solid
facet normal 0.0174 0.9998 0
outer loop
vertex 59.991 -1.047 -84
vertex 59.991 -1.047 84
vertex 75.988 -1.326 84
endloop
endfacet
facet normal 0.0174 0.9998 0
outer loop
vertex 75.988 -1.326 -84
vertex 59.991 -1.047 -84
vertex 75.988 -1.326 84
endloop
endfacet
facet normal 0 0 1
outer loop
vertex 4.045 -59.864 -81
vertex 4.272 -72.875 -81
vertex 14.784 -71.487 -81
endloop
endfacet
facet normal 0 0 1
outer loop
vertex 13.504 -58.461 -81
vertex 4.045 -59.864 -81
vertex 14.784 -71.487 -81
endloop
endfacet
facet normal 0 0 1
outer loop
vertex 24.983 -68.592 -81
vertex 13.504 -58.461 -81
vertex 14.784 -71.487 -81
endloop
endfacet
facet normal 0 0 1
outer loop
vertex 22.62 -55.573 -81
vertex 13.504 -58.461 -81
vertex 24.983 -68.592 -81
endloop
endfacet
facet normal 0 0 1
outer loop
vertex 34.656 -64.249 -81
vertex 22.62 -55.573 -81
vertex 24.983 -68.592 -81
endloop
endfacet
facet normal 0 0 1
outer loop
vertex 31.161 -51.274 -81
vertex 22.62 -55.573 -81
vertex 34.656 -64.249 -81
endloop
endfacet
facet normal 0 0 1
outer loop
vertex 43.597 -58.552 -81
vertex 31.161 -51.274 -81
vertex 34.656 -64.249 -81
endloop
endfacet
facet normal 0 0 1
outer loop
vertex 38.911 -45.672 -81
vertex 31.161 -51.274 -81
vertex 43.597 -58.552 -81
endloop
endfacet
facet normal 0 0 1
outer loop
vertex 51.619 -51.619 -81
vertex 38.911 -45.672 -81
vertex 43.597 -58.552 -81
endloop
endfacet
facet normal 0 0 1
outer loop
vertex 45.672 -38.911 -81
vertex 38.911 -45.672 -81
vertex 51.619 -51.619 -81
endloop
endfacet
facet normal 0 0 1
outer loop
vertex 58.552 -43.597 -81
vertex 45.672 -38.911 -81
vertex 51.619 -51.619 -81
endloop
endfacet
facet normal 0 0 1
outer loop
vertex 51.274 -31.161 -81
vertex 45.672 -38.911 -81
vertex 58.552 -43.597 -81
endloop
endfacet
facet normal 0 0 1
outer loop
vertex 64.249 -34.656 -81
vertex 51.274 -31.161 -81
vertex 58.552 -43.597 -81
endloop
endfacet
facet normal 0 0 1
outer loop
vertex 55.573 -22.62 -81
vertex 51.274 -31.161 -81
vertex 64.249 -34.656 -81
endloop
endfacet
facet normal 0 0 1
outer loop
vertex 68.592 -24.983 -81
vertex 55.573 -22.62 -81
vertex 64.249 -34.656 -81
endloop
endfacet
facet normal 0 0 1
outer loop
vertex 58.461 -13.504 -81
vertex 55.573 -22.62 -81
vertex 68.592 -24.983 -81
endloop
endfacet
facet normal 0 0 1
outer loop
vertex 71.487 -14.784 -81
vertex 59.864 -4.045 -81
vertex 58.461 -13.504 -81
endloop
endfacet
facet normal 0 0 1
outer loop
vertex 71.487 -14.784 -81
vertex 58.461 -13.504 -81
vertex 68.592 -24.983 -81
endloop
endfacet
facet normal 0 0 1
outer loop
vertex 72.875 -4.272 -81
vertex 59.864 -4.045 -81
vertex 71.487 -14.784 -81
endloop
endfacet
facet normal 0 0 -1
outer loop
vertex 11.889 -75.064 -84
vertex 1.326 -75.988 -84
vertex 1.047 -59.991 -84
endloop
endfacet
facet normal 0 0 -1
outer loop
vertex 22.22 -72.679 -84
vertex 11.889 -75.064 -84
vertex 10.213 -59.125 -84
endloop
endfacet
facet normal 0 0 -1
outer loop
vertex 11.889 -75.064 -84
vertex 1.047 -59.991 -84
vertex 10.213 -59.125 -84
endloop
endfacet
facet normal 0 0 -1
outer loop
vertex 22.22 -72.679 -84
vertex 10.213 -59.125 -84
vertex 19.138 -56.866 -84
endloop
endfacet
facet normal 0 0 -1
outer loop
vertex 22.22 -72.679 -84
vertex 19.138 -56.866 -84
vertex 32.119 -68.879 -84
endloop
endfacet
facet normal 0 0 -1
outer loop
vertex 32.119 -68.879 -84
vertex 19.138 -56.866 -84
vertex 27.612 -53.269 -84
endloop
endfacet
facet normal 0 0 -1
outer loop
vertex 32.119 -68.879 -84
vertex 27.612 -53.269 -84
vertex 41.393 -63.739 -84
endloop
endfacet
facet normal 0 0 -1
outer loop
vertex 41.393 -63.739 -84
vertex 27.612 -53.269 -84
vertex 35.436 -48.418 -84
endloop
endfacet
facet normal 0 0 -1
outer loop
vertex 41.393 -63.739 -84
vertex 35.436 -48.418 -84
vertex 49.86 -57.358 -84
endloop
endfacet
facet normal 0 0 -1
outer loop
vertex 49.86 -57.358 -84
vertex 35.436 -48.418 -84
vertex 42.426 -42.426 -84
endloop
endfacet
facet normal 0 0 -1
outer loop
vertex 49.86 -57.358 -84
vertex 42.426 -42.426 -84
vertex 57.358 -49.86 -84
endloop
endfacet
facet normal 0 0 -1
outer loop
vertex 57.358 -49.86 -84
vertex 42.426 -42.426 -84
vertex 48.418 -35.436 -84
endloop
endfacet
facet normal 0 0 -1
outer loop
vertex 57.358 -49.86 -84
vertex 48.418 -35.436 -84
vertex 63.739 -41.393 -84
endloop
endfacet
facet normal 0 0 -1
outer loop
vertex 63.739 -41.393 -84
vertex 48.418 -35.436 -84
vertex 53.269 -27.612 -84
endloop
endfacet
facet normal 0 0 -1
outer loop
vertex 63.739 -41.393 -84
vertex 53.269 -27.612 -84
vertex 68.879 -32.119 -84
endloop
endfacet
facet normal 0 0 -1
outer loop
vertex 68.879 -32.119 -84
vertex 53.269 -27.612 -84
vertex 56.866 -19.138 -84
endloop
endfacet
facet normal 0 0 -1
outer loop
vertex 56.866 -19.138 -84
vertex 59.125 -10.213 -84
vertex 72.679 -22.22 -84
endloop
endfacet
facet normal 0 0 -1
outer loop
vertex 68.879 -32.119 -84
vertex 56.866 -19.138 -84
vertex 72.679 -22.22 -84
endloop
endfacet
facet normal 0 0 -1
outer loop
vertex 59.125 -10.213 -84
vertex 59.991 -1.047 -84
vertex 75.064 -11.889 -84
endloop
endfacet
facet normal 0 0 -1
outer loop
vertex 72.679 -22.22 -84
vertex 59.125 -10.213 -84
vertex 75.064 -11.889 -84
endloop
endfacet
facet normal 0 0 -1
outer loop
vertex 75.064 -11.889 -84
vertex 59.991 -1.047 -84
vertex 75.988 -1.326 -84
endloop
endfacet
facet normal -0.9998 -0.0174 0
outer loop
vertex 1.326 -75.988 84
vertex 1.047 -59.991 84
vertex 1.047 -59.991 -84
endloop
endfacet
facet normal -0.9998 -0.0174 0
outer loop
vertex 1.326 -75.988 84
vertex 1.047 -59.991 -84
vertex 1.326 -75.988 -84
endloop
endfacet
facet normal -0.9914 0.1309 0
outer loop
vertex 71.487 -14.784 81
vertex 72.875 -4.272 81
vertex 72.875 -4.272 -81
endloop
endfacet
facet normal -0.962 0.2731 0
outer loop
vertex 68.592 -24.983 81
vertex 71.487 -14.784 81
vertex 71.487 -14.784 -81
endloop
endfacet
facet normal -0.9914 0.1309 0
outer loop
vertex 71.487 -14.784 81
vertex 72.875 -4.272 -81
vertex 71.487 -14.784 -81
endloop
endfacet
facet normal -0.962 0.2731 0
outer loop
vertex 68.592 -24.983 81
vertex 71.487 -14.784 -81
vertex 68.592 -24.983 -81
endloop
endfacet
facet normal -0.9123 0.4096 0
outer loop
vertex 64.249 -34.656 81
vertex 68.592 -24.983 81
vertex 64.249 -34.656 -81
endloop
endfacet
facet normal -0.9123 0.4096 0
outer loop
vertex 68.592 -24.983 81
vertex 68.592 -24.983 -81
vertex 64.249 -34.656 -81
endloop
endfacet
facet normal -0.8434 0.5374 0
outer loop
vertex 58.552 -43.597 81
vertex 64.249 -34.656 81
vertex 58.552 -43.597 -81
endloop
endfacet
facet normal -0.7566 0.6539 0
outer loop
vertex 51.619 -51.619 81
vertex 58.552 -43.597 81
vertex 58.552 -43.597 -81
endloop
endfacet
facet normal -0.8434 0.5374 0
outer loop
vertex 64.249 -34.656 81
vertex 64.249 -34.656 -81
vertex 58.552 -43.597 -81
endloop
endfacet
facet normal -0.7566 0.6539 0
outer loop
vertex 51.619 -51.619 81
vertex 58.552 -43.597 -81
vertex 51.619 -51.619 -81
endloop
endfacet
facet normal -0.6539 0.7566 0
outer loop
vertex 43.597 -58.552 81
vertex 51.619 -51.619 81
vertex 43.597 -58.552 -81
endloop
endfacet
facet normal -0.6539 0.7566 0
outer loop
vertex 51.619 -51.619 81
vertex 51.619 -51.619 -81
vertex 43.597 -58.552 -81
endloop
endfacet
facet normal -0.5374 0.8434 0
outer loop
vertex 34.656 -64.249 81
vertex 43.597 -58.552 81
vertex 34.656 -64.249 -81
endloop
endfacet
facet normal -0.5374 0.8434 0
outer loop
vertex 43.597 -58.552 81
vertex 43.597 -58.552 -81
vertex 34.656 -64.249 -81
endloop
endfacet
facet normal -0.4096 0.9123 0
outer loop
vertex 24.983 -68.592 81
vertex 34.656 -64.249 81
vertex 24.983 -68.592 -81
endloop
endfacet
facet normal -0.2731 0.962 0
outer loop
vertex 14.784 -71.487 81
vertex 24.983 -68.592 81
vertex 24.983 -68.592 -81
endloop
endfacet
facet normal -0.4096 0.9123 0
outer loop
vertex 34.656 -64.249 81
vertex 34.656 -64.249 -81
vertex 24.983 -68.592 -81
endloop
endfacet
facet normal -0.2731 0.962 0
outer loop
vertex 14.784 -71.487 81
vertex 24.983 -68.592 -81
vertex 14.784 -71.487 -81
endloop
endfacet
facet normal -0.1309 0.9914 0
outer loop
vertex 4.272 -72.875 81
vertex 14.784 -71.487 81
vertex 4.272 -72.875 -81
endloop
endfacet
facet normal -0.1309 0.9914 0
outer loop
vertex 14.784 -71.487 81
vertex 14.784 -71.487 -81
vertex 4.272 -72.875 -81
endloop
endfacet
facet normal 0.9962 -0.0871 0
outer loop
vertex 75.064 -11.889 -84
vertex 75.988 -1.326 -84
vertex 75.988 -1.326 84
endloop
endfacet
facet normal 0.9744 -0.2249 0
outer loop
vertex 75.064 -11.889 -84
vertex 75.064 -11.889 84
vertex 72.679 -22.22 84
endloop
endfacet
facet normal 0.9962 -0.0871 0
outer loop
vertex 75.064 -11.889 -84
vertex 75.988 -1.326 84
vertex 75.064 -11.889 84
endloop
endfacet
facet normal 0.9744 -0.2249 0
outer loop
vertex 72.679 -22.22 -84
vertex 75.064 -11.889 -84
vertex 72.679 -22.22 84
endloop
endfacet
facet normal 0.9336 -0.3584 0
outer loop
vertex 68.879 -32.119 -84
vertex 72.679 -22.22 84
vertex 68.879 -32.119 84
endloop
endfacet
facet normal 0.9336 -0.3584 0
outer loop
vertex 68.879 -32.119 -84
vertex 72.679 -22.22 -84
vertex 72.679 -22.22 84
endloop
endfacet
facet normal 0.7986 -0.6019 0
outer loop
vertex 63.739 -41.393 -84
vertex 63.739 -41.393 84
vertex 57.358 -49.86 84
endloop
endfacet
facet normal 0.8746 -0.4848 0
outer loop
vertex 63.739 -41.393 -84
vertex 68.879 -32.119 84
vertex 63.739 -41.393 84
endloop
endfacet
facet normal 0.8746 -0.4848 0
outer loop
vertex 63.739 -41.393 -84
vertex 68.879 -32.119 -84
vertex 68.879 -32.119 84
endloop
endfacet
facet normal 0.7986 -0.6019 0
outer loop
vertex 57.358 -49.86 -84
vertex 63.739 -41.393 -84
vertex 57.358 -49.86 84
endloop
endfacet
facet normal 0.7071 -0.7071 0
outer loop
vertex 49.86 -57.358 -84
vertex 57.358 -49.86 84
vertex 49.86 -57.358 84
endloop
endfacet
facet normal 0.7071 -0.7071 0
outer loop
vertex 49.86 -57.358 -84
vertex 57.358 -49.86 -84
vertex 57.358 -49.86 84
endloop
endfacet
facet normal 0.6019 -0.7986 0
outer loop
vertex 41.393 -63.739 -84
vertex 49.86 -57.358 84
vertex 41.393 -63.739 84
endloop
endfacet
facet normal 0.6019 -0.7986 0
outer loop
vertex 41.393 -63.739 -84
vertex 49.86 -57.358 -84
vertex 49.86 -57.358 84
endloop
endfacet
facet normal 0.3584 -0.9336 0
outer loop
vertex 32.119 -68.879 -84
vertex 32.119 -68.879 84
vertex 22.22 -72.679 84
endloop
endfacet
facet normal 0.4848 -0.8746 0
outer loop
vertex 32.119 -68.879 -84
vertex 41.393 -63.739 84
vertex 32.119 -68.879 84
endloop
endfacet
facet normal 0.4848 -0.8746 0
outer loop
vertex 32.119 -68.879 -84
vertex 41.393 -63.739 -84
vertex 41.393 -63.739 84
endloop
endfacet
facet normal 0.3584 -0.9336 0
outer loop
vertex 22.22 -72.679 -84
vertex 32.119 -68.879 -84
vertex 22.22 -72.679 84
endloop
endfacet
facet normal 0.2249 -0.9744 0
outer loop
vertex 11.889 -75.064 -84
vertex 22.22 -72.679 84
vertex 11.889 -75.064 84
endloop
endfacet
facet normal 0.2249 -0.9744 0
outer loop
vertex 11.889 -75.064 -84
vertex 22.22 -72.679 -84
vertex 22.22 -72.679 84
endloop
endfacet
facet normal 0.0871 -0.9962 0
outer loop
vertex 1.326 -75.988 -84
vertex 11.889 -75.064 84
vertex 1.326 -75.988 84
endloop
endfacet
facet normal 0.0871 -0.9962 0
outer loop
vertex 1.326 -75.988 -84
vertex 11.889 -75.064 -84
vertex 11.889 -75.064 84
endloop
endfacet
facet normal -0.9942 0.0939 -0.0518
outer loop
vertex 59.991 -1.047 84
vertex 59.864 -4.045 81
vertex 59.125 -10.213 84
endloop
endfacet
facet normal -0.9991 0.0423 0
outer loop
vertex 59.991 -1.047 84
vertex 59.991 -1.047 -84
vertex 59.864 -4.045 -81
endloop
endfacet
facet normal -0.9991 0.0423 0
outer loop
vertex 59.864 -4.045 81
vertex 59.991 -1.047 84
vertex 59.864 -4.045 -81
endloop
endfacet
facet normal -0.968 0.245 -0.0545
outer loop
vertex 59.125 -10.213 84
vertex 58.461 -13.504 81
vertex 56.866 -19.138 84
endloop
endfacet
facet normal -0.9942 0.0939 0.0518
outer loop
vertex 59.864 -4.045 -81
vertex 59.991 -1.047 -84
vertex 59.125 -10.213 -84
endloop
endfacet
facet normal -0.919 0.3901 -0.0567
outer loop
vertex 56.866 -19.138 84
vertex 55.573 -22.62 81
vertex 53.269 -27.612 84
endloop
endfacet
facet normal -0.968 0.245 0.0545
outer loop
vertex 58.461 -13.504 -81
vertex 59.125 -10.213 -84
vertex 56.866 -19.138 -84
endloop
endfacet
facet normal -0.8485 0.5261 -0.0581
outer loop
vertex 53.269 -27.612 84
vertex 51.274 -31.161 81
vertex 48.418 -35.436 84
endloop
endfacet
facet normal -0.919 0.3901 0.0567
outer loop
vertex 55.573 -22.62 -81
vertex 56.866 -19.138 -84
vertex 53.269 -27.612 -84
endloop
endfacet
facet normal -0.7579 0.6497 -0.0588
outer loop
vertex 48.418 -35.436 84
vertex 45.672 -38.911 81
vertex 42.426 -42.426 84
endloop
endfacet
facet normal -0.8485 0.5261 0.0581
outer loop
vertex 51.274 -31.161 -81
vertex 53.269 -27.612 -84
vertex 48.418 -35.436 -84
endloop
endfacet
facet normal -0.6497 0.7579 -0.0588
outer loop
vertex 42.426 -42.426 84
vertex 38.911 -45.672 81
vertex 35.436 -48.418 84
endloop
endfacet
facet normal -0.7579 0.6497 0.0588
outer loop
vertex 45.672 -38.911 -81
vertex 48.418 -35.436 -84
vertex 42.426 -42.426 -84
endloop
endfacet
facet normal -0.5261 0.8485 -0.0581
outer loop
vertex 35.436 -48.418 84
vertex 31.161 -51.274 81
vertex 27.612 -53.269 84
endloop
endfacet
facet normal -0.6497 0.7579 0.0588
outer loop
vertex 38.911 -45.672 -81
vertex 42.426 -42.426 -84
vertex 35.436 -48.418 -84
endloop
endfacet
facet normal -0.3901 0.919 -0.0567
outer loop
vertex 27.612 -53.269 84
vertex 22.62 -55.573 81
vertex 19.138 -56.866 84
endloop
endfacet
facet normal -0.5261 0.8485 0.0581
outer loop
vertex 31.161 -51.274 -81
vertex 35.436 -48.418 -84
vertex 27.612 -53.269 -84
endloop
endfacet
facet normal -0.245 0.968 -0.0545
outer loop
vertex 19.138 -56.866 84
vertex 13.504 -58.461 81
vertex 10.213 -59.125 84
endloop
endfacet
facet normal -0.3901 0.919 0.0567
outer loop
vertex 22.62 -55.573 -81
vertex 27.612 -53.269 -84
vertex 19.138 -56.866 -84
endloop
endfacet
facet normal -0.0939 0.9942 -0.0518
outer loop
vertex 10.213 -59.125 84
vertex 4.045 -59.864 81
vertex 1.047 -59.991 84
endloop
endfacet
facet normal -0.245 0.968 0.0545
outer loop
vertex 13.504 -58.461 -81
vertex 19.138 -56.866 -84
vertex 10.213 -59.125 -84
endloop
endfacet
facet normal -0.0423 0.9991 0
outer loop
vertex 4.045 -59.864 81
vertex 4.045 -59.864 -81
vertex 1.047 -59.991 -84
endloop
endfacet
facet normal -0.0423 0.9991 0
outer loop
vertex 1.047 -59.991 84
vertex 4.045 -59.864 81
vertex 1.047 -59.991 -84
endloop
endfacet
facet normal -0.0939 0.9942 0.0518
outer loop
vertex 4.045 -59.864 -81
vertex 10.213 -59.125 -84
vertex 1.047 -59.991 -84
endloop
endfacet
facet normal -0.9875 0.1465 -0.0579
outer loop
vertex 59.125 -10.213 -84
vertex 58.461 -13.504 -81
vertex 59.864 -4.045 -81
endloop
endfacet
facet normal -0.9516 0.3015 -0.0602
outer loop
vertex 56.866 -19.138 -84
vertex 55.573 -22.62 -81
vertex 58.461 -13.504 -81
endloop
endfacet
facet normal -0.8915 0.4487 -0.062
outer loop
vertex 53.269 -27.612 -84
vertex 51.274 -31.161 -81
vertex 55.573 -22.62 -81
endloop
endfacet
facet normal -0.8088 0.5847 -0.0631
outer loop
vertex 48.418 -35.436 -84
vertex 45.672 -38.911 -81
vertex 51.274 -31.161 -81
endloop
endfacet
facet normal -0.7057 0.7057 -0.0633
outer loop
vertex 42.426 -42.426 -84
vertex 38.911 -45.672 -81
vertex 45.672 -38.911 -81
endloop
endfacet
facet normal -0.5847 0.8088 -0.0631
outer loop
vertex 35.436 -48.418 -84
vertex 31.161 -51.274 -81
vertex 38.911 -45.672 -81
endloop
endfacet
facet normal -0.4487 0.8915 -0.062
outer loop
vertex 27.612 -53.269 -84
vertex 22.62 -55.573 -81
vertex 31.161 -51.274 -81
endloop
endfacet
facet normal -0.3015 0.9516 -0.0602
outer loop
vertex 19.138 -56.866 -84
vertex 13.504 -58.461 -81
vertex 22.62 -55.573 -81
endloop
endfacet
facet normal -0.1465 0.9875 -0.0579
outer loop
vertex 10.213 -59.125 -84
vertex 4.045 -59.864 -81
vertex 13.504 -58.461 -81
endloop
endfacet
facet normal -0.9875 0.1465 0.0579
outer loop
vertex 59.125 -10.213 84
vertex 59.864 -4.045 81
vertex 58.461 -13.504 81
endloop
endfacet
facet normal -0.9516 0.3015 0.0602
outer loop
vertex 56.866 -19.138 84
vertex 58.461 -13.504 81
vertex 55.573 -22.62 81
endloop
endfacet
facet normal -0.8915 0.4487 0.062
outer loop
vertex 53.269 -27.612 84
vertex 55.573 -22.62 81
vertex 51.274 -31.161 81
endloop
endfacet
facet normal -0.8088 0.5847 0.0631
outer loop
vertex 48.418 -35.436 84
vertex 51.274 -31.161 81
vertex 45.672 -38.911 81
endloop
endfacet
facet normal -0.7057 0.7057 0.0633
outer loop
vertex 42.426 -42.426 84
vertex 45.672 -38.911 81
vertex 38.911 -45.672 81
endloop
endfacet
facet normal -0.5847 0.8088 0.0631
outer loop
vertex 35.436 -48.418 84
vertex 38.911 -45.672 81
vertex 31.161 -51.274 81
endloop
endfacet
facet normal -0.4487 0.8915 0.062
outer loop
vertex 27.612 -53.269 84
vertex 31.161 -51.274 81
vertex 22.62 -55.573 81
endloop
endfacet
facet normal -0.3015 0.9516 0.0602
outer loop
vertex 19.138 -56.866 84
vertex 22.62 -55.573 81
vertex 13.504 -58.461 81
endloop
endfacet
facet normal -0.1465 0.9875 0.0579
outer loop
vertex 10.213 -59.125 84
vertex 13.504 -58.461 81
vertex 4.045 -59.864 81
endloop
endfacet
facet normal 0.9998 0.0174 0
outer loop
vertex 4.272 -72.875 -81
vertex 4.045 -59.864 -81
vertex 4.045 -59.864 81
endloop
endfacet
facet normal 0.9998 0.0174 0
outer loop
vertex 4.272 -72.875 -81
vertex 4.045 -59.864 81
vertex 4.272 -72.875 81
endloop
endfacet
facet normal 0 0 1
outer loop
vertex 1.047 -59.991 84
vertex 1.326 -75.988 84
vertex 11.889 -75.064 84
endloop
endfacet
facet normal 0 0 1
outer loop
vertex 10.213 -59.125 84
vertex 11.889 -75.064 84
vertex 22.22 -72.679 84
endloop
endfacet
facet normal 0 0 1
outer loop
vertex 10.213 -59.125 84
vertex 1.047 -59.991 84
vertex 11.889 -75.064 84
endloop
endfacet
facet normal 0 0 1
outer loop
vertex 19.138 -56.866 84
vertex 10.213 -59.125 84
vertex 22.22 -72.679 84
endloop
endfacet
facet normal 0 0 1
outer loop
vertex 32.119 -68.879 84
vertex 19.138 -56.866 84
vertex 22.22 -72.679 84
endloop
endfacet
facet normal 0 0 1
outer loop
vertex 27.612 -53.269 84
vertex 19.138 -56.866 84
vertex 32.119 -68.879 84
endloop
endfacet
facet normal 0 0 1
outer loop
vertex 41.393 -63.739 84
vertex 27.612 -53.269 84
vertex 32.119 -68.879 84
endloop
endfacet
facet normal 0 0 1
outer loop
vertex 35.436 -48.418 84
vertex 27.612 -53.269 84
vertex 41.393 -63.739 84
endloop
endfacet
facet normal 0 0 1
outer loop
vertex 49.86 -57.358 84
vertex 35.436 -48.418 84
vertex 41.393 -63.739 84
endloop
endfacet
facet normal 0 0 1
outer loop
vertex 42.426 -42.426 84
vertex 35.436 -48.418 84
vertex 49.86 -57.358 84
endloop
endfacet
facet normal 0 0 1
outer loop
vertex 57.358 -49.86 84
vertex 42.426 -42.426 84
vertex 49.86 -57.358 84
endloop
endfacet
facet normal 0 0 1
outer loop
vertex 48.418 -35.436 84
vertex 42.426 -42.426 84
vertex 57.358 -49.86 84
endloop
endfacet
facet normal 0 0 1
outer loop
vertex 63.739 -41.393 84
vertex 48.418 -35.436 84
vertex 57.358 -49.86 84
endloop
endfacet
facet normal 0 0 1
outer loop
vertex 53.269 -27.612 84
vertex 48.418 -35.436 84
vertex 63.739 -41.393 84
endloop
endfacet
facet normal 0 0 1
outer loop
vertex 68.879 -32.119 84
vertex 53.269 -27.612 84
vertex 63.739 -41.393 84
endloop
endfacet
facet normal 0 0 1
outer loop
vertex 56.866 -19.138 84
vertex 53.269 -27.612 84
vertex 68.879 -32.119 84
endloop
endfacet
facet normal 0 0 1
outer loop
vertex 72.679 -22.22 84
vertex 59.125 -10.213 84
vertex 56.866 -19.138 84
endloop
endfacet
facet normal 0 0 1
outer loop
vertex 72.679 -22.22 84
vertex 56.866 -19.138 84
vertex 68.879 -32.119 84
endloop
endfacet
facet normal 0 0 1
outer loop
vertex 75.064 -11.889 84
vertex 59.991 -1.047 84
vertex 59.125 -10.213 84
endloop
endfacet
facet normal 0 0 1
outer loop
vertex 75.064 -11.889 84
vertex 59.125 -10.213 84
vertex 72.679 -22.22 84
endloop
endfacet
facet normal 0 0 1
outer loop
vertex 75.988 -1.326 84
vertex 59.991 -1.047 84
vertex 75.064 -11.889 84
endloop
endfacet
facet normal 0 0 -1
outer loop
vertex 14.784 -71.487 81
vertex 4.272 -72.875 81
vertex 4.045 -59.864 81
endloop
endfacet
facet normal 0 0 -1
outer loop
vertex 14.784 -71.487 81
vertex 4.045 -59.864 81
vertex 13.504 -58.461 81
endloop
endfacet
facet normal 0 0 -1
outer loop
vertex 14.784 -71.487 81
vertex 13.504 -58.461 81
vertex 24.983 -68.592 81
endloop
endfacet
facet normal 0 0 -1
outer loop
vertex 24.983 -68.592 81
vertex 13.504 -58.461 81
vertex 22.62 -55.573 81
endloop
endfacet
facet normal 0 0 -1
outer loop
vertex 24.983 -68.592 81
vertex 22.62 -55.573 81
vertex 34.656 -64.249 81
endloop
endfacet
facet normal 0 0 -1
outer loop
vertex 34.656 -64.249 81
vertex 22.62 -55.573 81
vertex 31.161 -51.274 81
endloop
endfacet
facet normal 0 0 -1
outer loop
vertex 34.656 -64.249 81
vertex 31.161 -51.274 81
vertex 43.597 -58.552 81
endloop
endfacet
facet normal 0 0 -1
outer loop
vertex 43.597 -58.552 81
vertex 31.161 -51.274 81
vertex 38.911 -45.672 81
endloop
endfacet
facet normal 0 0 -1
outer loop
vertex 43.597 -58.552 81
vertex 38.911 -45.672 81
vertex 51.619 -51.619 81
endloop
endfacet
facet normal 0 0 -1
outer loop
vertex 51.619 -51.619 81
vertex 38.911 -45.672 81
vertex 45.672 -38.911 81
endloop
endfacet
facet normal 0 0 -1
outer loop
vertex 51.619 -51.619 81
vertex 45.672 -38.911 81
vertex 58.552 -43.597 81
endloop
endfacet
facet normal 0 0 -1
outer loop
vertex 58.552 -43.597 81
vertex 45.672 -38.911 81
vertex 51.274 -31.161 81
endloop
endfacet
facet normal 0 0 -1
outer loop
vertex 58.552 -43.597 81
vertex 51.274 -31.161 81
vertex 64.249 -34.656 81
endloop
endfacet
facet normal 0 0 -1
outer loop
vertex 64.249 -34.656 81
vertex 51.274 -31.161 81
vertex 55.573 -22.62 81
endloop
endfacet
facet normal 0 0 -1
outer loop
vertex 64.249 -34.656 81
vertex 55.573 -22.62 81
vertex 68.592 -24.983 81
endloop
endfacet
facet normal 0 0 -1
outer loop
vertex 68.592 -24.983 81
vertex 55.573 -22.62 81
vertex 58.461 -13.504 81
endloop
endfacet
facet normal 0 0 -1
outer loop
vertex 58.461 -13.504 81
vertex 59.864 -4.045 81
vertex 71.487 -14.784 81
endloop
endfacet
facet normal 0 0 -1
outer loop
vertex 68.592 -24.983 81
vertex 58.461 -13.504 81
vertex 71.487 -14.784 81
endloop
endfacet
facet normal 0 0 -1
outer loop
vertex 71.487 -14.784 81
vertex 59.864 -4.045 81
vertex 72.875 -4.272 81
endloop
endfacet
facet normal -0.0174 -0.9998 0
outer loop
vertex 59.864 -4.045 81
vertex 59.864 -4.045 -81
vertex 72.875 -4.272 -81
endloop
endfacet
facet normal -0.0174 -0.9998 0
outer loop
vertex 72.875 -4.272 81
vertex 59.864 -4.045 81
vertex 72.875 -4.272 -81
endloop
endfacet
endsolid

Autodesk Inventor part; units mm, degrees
ref_plane "Work Plane1" through (0, 0, 87) normal (0, 0, 1) x (1, 0, 0)
ref_plane "YZ Plane" through (0, 0, 0) normal (1, 0, 0) x (0, 1, 0)
ref_plane "XZ Plane" through (0, 0, 0) normal (0, 1, 0) x (-1, 0, 0)
sketch "Sketch4" plane through (0, 0, 0) normal (0, 0, 1) x (1, 0, 0)
  arc A0 (1.3264, -75.9884) -> (75.9884, -1.3264) centre (0, 0) ccw
  arc A1 (1.0471, -59.9909) -> (59.9909, -1.0471) centre (0, 0) ccw
  line L0 (0, -92.1462) -> (0, 0) construction
  line L1 (0, 0) -> (129.1278, 0) construction
  line L2 (0, 0) -> (106.82, -1.8646) construction
  line L3 (0, 0) -> (1.3871, -79.4693) construction
  line L4 (1.0471, -59.9909) -> (1.3264, -75.9884)
  line L5 (59.9909, -1.0471) -> (75.9884, -1.3264)
  dimension "d33" = 152
  dimension "d34" = 120
  dimension "d35" = 1
  dimension "d36" = 1
extrude "Extrusion3" add sketch "Sketch4" along normal mid plane 168
shell "Shell2" thickness 3 removed faces 1 at (4.4562, -59.8343, 28)
sketch "Sketch1" plane through (0, 0, 0) normal (0, 0, 1) x (1, 0, 0)
  circle A0 centre (0, 0) radius 77.5
  circle A1 centre (0, 0) radius 76.5
  dimension "d0" = 155
  dimension "d1" = 153
sketch "Sketch2" plane through (0, 0, 87) normal (0, 0, 1) x (1, 0, 0)
  line L0 (0, 0) -> (0, -91.1898) construction
  line L1 (0, 0) -> (8.9718, -102.5486) construction
  arc A0 (7.9909, -74.1258) -> (5.0023, -74.3873) centre (6.2752, -71.726) ccw
  line L2 (5.0023, -74.3873) -> (5.1718, -76.325)
  line L3 (7.9909, -74.1258) -> (8.1604, -76.0635)
  circle A1 centre (0, 0) radius 76.5 projected
  arc A2 (5.1718, -76.325) -> (8.1604, -76.0635) centre (0, 0) ccw
  line L4 (7.9909, -74.1258) -> (0, 0) construction
  line L5 (0, 0) -> (5.0023, -74.3873) construction
  line L6 (0, 0) -> (93.5228, -13.1438) construction
  line L7 (0, 0) -> (97.964, 0) construction
  circle A3 centre (0, 0) radius 76.5
  line L8 (68, 0) -> (76.5, 0)
  line L9 (67.3382, -9.4638) -> (75.7555, -10.6467)
  arc A4 (67.3382, -9.4638) -> (68, 0) centre (0, 0) ccw
  point P0 (75.7555, -10.6467)
  dimension "d5" = 5
  dimension "d6" = 5.9
  dimension "d7" = 72
  dimension "d8" = 3
  dimension "d12" = 8
  dimension "d32" = 68
sketch "Sketch3" plane through (75.7555, -10.6467, 84) normal (-0.1392, -0.9903, 0) x (0.9903, -0.1392, 0)
  line L0 (-8.1618, 1) -> (0, 1)
  line L1 (0, 1) -> (0, 5)
  line L2 (0, 5) -> (-8.1618, 5)
  line L3 (-8.1618, 5) -> (-8.1618, 1)
  line L4 (0, 6) -> (0, -174) construction
  line L5 (0, -1.3495) -> (0, 7.9011) construction
  line L6 (-9.1618, 0) -> (-0.7445, 0) construction
  line L7 (-0.7445, 6) -> (-9.1618, 6) construction
  line L8 (-9.1618, 6) -> (-9.1618, 0) construction
  line L9 (-76.5, -210.3802) -> (-76.5, 44.2814) projected
  point P0 (-76.5, -84)
  dimension "d23" = 1
  dimension "d24" = 1
  dimension "d25" = 1
properties part number "shim_former"
